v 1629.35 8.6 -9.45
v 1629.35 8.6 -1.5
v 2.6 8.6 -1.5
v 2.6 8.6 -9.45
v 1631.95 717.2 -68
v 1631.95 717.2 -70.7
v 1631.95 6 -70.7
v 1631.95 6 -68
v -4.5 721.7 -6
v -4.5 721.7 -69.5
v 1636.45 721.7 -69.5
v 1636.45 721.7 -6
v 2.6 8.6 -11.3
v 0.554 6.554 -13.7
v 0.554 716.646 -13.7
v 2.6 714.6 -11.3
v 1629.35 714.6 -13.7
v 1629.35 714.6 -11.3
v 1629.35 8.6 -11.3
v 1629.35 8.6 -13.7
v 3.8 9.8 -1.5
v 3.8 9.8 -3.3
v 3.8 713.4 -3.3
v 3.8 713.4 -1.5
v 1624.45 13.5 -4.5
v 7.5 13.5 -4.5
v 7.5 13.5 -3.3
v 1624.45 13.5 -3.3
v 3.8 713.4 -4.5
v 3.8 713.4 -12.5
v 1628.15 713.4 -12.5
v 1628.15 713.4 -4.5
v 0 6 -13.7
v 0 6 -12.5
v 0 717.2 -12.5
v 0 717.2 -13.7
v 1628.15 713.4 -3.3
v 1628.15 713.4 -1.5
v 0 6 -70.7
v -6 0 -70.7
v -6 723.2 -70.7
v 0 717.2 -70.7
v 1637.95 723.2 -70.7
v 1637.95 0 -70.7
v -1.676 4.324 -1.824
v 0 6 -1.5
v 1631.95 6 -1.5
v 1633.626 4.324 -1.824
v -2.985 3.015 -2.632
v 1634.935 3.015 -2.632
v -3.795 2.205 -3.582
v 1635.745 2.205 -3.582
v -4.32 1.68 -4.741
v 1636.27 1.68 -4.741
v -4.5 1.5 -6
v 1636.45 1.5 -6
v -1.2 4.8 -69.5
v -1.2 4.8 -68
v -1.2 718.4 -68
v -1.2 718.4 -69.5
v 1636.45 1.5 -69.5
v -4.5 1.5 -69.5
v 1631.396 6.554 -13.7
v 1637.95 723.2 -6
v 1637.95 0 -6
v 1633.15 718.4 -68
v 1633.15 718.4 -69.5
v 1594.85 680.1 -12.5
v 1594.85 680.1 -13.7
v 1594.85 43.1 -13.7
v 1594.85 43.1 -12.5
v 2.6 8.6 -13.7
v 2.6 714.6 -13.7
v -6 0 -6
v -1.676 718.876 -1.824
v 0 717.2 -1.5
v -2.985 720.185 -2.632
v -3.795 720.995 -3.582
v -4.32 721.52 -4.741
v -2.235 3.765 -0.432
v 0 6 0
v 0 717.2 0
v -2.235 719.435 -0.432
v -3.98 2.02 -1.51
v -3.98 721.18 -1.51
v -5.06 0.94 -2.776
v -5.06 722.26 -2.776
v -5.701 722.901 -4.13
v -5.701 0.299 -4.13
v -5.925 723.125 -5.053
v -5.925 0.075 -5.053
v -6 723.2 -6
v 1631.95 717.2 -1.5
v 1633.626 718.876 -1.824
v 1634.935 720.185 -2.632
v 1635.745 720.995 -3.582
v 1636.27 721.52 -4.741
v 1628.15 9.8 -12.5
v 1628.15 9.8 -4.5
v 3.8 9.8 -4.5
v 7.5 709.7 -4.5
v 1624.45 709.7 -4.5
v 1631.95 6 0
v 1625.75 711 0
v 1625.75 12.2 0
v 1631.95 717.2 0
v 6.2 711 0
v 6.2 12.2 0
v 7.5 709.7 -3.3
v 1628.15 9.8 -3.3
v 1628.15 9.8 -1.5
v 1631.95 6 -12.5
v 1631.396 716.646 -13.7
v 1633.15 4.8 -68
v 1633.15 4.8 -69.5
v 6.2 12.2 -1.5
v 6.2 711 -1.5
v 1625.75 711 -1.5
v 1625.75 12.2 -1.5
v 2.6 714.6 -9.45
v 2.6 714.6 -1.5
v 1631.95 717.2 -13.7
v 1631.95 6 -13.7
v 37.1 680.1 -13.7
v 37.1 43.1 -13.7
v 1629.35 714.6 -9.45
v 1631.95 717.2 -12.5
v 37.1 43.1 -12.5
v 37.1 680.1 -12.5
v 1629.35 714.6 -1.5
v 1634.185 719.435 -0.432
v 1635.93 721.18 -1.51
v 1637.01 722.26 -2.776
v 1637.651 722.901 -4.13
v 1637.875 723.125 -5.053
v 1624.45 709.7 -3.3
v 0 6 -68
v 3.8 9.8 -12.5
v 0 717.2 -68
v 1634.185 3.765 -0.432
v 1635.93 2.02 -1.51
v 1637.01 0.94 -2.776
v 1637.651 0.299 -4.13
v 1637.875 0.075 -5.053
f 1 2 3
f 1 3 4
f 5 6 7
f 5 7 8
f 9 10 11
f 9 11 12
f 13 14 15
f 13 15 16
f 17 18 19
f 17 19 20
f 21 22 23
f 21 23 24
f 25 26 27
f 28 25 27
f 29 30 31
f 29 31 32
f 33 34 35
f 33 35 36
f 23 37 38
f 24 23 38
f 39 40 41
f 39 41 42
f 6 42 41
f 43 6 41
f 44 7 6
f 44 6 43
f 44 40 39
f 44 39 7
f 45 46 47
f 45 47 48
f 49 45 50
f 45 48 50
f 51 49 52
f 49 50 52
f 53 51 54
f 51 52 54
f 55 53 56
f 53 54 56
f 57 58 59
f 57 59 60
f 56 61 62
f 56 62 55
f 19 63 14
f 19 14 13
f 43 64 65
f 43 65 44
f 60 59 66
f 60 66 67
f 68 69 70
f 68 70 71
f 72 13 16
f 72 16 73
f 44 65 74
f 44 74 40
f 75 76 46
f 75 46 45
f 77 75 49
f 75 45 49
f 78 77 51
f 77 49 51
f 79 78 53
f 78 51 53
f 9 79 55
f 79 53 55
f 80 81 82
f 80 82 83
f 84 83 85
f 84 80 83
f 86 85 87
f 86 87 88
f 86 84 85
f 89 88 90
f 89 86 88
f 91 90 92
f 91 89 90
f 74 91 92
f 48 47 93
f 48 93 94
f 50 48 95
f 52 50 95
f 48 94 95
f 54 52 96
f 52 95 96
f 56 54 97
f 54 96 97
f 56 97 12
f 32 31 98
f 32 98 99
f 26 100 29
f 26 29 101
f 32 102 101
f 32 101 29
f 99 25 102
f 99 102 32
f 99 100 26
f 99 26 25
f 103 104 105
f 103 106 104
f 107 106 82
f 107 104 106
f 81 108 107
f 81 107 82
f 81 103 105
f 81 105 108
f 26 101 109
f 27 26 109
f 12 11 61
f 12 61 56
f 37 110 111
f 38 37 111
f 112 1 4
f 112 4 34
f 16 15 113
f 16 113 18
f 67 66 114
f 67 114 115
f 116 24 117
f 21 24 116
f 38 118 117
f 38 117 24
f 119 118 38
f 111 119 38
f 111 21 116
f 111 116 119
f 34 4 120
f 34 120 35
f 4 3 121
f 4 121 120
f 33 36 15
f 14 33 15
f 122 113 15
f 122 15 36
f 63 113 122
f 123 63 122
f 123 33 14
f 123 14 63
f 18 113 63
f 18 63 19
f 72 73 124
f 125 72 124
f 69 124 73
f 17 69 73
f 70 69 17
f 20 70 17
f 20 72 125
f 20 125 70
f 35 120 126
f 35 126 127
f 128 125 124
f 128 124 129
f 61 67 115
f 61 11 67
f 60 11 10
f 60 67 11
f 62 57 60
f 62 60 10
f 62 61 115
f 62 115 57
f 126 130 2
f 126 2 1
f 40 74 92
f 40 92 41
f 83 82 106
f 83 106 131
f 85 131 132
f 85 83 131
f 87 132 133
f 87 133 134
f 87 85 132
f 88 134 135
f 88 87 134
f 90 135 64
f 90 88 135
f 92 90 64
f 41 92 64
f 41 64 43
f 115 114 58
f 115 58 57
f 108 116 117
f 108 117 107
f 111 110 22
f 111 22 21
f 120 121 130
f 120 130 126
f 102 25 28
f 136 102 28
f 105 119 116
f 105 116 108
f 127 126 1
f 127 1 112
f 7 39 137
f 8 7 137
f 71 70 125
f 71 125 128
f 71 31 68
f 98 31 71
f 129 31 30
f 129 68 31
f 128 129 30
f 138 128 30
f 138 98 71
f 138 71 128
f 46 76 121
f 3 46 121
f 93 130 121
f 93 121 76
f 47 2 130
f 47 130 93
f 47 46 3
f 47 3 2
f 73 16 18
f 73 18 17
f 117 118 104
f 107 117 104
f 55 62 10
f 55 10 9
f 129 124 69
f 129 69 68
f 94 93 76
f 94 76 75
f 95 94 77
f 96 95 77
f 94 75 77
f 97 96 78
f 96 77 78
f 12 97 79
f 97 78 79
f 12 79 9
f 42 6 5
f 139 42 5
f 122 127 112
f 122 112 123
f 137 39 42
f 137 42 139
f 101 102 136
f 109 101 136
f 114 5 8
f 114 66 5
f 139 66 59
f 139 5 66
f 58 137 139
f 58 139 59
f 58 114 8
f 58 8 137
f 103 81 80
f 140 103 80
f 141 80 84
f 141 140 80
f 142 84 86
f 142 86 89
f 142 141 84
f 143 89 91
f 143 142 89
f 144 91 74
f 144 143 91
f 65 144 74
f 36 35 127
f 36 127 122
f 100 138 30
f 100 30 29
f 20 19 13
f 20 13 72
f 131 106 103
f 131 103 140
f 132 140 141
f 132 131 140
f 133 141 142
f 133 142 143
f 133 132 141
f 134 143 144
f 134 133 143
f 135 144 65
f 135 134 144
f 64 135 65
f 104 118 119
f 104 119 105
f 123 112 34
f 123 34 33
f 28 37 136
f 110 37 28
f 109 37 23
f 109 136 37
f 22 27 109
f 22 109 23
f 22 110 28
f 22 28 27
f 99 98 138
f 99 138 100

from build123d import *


with BuildPart() as f2:
    # F2: sweep along a path in F1
    with BuildLine(Plane.XY) as f2_path:
        Line((0, 717.2), (0, 6))
        Line((0, 6), (1631.95, 6))
        Line((1631.95, 6), (1631.95, 717.2))
        Line((1631.95, 717.2), (0, 717.2))
    # F0 (on Right) → F2 (sweep)
    with BuildSketch(Plane.YZ):
        with BuildLine():
            Line((0, -6), (0, -70.7))
            Line((0, -70.7), (6, -70.7))
            Line((6, -70.7), (6, -68))
            Line((6, -68), (4.8, -68))
            Line((4.8, -68), (4.8, -69.5))
            Line((4.8, -69.5), (1.5, -69.5))
            Line((1.5, -69.5), (1.5, -6))
            ThreePointArc((1.5, -6), (2.8180194847, -2.8180194847), (6, -1.5))
            Line((6, -1.5), (8.6, -1.5))
            Line((8.6, -1.5), (8.6, -9.4503759398))
            Line((8.6, -9.4503759398), (6, -12.5))
            Line((6, -12.5), (6, -13.7))
            Line((6, -13.7), (6.5538461538, -13.7))
            Line((6.5538461538, -13.7), (8.6, -11.3))
            Line((8.6, -11.3), (8.6, -13.7))
            Line((8.6, -13.7), (43.1, -13.7))
            Line((43.1, -13.7), (43.1, -12.5))
            Line((43.1, -12.5), (9.8, -12.5))
            Line((9.8, -12.5), (9.8, -4.5))
            Line((9.8, -4.5), (13.5, -4.5))
            Line((13.5, -4.5), (13.5, -3.3))
            Line((13.5, -3.3), (9.8, -3.3))
            Line((9.8, -3.3), (9.8, -1.5))
            Line((9.8, -1.5), (12.2, -1.5))
            Line((12.2, -1.5), (12.2, 0))
            Line((12.2, 0), (6, 0))
            ThreePointArc((6, 0), (1.7573593129, -1.7573593129), (0, -6))
        make_face()
    sweep(path=f2_path.line, transition=Transition.RIGHT)


solid = f2.part
